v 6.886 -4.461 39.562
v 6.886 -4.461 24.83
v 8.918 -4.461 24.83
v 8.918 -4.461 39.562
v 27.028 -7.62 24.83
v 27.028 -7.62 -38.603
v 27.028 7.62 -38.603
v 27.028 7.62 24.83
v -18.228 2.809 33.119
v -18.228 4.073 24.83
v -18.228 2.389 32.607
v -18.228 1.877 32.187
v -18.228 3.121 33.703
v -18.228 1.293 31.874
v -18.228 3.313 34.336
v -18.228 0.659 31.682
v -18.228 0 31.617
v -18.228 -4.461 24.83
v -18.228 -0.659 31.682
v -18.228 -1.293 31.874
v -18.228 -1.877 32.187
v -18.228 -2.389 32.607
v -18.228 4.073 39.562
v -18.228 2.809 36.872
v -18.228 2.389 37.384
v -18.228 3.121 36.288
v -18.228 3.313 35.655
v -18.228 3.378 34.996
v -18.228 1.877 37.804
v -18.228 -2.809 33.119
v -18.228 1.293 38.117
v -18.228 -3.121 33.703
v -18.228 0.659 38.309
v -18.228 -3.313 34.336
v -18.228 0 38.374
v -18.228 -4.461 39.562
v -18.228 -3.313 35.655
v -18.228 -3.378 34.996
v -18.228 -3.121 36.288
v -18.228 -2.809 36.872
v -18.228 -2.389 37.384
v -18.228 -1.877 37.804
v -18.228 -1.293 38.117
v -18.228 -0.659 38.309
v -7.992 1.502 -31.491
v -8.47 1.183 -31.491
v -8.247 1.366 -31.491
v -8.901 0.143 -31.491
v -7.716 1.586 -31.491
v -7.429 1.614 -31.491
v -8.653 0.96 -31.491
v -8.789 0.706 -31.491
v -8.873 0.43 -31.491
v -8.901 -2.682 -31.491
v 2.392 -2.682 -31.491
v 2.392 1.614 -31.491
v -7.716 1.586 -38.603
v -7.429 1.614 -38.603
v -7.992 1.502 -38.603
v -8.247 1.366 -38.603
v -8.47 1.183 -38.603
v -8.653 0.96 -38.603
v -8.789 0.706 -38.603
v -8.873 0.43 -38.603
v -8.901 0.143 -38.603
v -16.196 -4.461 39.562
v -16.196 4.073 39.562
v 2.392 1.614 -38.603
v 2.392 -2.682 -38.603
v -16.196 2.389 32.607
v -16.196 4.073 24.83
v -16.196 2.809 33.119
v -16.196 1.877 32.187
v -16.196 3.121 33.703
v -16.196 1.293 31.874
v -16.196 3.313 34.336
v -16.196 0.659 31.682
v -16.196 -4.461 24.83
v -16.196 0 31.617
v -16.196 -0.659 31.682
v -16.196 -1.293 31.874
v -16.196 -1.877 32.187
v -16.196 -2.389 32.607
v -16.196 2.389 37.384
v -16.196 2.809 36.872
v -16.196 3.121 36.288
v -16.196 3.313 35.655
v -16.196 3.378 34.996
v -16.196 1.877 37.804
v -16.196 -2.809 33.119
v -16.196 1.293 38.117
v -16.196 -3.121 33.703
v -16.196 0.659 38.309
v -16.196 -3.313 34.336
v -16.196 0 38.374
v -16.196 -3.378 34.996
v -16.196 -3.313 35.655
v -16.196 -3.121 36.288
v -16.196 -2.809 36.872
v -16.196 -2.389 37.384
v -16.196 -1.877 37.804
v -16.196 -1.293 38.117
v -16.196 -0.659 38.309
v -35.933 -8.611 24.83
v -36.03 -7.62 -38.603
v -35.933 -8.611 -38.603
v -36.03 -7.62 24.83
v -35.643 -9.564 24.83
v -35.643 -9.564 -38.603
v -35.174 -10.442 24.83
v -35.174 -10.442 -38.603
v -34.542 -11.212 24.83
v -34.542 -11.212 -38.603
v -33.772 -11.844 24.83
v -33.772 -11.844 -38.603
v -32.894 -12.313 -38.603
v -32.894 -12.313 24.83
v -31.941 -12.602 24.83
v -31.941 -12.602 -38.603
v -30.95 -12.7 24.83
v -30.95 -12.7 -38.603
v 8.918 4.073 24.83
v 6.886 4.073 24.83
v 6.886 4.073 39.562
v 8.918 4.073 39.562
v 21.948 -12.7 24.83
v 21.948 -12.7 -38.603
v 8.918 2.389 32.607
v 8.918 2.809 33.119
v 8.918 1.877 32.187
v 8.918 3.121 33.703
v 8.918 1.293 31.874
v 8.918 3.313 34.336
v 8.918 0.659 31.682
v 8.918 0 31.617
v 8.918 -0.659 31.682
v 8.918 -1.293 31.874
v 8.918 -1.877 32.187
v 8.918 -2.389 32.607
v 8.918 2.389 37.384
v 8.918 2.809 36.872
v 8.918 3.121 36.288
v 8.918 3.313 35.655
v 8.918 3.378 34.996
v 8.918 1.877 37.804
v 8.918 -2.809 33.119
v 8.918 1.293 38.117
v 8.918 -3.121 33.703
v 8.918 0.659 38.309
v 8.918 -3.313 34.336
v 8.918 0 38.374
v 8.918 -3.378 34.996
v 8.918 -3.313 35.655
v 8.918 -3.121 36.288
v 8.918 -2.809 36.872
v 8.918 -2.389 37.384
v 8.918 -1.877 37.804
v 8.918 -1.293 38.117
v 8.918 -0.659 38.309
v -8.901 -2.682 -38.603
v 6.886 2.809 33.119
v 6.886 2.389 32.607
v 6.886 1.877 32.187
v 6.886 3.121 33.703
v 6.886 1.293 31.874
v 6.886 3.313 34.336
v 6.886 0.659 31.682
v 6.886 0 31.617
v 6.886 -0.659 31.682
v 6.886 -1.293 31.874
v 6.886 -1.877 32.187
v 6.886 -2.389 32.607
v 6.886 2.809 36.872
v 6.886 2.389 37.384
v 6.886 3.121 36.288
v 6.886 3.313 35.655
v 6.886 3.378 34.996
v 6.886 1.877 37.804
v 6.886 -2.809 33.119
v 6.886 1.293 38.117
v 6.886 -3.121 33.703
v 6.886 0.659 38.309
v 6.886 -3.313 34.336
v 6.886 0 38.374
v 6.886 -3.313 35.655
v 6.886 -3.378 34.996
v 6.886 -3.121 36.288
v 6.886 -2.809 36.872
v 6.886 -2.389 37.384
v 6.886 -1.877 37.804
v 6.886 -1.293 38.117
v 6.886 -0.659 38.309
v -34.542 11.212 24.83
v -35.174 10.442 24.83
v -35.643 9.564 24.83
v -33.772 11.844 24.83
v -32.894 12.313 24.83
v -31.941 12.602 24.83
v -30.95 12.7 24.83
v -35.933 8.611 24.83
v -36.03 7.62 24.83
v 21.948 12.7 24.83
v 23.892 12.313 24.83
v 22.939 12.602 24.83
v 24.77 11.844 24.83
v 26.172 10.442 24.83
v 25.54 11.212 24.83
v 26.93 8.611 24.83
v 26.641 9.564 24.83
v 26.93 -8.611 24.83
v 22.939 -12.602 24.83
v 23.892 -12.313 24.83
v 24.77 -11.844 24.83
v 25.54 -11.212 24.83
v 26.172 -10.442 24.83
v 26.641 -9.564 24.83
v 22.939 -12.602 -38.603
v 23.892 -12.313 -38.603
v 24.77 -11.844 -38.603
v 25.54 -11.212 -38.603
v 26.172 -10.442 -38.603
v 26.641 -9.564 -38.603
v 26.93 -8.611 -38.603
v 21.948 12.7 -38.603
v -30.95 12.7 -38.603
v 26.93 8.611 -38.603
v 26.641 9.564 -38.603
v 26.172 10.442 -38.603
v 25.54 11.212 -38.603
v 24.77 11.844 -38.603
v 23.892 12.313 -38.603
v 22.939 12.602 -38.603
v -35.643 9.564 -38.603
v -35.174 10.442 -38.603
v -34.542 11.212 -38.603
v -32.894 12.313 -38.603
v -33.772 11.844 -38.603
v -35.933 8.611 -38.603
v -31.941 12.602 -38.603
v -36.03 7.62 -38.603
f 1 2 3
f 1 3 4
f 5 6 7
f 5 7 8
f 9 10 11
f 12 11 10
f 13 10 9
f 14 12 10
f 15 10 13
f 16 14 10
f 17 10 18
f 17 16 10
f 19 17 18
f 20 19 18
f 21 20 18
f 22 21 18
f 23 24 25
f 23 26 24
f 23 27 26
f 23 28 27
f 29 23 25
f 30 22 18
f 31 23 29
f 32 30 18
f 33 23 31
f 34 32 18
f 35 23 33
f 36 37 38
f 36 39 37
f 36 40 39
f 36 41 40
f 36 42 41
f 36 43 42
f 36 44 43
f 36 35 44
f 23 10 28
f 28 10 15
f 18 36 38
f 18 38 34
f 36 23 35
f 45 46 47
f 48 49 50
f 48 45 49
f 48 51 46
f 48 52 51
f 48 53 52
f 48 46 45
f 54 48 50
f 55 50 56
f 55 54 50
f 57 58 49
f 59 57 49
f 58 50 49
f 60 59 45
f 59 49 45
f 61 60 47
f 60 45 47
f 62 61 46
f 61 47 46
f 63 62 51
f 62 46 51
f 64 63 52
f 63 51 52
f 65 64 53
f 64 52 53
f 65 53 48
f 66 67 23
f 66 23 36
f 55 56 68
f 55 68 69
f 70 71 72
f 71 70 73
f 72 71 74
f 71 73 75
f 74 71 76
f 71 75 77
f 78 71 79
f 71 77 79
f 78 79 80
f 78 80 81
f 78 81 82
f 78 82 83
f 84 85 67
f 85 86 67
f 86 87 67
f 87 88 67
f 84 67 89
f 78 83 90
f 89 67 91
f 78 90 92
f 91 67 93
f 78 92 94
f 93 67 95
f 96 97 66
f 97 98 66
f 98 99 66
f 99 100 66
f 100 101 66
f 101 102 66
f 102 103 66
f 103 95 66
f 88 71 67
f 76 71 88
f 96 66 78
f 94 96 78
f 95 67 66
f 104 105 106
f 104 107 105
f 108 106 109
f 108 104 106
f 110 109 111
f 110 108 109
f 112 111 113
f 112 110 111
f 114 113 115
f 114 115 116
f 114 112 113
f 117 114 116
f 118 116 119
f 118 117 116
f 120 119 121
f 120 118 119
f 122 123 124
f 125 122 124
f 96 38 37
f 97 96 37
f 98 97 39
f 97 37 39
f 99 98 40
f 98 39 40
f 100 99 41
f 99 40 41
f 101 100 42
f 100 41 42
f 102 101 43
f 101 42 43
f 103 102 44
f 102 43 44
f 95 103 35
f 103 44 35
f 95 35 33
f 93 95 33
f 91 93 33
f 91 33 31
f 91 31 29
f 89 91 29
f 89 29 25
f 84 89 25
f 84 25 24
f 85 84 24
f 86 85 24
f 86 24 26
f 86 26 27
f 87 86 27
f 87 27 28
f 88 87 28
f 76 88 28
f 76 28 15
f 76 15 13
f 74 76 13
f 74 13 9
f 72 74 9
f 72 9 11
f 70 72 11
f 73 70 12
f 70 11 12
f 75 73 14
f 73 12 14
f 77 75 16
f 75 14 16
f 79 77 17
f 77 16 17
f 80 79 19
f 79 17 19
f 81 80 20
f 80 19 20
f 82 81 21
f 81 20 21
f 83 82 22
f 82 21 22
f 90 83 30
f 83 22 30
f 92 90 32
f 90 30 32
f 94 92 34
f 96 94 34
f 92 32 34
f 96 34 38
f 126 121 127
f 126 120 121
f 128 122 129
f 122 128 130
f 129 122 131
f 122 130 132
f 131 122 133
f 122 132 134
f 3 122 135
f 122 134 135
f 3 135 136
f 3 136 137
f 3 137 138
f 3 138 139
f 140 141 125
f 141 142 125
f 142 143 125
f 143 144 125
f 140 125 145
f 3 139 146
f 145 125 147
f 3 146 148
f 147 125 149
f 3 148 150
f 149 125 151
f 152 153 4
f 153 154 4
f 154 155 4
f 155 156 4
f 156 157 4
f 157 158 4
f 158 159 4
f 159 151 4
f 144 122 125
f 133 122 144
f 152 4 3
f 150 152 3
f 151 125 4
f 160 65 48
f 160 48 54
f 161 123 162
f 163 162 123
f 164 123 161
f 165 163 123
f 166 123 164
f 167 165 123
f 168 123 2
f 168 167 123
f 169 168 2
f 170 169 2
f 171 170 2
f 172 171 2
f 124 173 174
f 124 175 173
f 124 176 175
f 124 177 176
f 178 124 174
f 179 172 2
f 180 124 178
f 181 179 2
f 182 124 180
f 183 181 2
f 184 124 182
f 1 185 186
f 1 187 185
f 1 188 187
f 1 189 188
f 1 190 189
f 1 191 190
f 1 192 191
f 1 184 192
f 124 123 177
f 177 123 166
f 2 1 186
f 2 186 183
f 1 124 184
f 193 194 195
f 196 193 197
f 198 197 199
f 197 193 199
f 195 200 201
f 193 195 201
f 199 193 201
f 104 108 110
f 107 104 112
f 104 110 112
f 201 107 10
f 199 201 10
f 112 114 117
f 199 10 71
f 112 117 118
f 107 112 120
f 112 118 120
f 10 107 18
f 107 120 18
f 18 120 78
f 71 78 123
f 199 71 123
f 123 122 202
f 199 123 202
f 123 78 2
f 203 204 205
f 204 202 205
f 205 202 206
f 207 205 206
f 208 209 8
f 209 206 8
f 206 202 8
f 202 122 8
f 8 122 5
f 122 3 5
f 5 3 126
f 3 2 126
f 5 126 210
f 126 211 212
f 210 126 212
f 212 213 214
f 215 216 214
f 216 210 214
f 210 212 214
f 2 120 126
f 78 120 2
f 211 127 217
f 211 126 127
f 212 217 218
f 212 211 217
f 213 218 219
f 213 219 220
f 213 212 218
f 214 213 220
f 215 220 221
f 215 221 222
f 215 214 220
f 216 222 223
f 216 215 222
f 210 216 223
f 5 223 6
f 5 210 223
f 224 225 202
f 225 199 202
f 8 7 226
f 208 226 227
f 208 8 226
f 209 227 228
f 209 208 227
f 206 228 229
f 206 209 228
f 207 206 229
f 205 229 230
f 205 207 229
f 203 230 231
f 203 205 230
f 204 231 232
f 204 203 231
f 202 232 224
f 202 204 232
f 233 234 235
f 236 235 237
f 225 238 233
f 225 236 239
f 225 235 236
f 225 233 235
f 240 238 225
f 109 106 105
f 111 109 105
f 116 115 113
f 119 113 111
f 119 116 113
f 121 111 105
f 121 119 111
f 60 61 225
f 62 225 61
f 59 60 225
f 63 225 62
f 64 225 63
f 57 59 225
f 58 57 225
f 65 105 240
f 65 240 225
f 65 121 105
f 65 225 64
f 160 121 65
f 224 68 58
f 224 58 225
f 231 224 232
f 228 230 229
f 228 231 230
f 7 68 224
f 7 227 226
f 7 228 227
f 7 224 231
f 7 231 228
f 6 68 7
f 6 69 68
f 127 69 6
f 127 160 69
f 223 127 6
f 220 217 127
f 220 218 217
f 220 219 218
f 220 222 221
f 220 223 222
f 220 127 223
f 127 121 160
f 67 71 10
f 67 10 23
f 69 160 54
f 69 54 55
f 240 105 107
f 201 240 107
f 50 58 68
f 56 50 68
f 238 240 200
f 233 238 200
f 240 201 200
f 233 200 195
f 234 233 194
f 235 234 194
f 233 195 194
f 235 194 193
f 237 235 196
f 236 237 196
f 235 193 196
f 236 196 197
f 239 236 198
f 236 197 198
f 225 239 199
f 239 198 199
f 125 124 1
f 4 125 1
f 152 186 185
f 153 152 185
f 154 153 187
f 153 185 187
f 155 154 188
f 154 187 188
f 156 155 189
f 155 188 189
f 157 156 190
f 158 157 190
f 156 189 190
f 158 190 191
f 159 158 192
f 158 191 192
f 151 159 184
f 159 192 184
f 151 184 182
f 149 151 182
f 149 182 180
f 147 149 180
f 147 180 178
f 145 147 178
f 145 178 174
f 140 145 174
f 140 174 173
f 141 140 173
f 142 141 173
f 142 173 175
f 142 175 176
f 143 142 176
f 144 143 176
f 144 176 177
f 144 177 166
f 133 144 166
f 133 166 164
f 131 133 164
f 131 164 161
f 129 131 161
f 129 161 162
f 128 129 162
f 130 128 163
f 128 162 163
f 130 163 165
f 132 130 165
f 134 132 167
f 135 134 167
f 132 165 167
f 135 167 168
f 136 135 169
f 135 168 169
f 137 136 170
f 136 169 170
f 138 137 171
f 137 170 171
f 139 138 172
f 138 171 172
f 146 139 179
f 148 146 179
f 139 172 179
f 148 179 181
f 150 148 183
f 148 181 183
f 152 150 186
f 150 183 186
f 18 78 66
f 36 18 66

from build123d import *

# Parameters (mm, degrees)
F0_W      = 63.0582608283
F0_H      = 63.4325034916
F1_DEPTH  = 12.7
F2_R      = 5.08
F4_E1_W   = 8.5344002582
F4_E1_H   = 14.732
F5_DEPTH  = 2.032
F4_E2_W   = 8.5344002582
F4_E2_H   = 14.732
F6_DEPTH  = 2.032
F8_D      = 6.7564
F9_W      = 11.2923893612
F9_H      = 4.2961570434
F10_DEPTH = 7.112
F11_R     = 1.4717045876


with BuildPart() as f1:
    # F0 (on Front) → F1 (new body, symmetric)
    with BuildSketch(Plane.XZ):
        with Locations((-4.5010391623, -6.8866405636)):
            Rectangle(F0_W, F0_H)
    extrude(amount=F1_DEPTH, both=True)

    # F2
    f2_edges = [f1.edges().sort_by_distance(p)[0] for p in [
        (27.028091, -12.7, -6.886641),
        (27.028091, 12.7, -6.886641),
        (-36.03017, 12.7, -6.886641),
        (-36.03017, -12.7, -6.886641),
    ]]
    fillet(f2_edges, radius=F2_R)

    # F4_E1 (on explicit) → F5 (join)
    with BuildSketch(Plane(origin=(-16.1959640682, 4.0732366033, 24.8296111822), x_dir=(0, -1, 0), z_dir=(-1, 0, 0))):
        with Locations((4.2672001291, 7.366)):
            Rectangle(F4_E1_W, F4_E1_H)
    extrude(amount=F5_DEPTH)

    # F4_E2 (on explicit) → F6 (join)
    with BuildSketch(Plane(origin=(6.8857083097, 4.0732364287, 24.8296111822), x_dir=(0, -1, 0), z_dir=(-1, 0, 0))):
        with Locations((4.2672001291, 7.366)):
            Rectangle(F4_E2_W, F4_E2_H)
    extrude(amount=-F6_DEPTH)

    # F8 (through all)
    with Locations(Plane.YZ.offset(8.9177083097)):
        with Locations((0, 34.9955298007)):
            Hole(F8_D / 2)

    # F9 (on face) → F10 (cut)
    with BuildSketch(Plane(origin=(0, 0, -38.6028923094), x_dir=(1, 0, 0), z_dir=(0, 0, -1))):
        with Locations((-3.2546349103, 0.5336764734)):
            Rectangle(F9_W, F9_H)
    extrude(amount=-F10_DEPTH, mode=Mode.SUBTRACT)

    # F11
    f11_edges = [f1.edges().sort_by_distance(p)[0] for p in [
        (-8.90083, 1.614402, -35.046892),
    ]]
    fillet(f11_edges, radius=F11_R)


solid = f1.part
